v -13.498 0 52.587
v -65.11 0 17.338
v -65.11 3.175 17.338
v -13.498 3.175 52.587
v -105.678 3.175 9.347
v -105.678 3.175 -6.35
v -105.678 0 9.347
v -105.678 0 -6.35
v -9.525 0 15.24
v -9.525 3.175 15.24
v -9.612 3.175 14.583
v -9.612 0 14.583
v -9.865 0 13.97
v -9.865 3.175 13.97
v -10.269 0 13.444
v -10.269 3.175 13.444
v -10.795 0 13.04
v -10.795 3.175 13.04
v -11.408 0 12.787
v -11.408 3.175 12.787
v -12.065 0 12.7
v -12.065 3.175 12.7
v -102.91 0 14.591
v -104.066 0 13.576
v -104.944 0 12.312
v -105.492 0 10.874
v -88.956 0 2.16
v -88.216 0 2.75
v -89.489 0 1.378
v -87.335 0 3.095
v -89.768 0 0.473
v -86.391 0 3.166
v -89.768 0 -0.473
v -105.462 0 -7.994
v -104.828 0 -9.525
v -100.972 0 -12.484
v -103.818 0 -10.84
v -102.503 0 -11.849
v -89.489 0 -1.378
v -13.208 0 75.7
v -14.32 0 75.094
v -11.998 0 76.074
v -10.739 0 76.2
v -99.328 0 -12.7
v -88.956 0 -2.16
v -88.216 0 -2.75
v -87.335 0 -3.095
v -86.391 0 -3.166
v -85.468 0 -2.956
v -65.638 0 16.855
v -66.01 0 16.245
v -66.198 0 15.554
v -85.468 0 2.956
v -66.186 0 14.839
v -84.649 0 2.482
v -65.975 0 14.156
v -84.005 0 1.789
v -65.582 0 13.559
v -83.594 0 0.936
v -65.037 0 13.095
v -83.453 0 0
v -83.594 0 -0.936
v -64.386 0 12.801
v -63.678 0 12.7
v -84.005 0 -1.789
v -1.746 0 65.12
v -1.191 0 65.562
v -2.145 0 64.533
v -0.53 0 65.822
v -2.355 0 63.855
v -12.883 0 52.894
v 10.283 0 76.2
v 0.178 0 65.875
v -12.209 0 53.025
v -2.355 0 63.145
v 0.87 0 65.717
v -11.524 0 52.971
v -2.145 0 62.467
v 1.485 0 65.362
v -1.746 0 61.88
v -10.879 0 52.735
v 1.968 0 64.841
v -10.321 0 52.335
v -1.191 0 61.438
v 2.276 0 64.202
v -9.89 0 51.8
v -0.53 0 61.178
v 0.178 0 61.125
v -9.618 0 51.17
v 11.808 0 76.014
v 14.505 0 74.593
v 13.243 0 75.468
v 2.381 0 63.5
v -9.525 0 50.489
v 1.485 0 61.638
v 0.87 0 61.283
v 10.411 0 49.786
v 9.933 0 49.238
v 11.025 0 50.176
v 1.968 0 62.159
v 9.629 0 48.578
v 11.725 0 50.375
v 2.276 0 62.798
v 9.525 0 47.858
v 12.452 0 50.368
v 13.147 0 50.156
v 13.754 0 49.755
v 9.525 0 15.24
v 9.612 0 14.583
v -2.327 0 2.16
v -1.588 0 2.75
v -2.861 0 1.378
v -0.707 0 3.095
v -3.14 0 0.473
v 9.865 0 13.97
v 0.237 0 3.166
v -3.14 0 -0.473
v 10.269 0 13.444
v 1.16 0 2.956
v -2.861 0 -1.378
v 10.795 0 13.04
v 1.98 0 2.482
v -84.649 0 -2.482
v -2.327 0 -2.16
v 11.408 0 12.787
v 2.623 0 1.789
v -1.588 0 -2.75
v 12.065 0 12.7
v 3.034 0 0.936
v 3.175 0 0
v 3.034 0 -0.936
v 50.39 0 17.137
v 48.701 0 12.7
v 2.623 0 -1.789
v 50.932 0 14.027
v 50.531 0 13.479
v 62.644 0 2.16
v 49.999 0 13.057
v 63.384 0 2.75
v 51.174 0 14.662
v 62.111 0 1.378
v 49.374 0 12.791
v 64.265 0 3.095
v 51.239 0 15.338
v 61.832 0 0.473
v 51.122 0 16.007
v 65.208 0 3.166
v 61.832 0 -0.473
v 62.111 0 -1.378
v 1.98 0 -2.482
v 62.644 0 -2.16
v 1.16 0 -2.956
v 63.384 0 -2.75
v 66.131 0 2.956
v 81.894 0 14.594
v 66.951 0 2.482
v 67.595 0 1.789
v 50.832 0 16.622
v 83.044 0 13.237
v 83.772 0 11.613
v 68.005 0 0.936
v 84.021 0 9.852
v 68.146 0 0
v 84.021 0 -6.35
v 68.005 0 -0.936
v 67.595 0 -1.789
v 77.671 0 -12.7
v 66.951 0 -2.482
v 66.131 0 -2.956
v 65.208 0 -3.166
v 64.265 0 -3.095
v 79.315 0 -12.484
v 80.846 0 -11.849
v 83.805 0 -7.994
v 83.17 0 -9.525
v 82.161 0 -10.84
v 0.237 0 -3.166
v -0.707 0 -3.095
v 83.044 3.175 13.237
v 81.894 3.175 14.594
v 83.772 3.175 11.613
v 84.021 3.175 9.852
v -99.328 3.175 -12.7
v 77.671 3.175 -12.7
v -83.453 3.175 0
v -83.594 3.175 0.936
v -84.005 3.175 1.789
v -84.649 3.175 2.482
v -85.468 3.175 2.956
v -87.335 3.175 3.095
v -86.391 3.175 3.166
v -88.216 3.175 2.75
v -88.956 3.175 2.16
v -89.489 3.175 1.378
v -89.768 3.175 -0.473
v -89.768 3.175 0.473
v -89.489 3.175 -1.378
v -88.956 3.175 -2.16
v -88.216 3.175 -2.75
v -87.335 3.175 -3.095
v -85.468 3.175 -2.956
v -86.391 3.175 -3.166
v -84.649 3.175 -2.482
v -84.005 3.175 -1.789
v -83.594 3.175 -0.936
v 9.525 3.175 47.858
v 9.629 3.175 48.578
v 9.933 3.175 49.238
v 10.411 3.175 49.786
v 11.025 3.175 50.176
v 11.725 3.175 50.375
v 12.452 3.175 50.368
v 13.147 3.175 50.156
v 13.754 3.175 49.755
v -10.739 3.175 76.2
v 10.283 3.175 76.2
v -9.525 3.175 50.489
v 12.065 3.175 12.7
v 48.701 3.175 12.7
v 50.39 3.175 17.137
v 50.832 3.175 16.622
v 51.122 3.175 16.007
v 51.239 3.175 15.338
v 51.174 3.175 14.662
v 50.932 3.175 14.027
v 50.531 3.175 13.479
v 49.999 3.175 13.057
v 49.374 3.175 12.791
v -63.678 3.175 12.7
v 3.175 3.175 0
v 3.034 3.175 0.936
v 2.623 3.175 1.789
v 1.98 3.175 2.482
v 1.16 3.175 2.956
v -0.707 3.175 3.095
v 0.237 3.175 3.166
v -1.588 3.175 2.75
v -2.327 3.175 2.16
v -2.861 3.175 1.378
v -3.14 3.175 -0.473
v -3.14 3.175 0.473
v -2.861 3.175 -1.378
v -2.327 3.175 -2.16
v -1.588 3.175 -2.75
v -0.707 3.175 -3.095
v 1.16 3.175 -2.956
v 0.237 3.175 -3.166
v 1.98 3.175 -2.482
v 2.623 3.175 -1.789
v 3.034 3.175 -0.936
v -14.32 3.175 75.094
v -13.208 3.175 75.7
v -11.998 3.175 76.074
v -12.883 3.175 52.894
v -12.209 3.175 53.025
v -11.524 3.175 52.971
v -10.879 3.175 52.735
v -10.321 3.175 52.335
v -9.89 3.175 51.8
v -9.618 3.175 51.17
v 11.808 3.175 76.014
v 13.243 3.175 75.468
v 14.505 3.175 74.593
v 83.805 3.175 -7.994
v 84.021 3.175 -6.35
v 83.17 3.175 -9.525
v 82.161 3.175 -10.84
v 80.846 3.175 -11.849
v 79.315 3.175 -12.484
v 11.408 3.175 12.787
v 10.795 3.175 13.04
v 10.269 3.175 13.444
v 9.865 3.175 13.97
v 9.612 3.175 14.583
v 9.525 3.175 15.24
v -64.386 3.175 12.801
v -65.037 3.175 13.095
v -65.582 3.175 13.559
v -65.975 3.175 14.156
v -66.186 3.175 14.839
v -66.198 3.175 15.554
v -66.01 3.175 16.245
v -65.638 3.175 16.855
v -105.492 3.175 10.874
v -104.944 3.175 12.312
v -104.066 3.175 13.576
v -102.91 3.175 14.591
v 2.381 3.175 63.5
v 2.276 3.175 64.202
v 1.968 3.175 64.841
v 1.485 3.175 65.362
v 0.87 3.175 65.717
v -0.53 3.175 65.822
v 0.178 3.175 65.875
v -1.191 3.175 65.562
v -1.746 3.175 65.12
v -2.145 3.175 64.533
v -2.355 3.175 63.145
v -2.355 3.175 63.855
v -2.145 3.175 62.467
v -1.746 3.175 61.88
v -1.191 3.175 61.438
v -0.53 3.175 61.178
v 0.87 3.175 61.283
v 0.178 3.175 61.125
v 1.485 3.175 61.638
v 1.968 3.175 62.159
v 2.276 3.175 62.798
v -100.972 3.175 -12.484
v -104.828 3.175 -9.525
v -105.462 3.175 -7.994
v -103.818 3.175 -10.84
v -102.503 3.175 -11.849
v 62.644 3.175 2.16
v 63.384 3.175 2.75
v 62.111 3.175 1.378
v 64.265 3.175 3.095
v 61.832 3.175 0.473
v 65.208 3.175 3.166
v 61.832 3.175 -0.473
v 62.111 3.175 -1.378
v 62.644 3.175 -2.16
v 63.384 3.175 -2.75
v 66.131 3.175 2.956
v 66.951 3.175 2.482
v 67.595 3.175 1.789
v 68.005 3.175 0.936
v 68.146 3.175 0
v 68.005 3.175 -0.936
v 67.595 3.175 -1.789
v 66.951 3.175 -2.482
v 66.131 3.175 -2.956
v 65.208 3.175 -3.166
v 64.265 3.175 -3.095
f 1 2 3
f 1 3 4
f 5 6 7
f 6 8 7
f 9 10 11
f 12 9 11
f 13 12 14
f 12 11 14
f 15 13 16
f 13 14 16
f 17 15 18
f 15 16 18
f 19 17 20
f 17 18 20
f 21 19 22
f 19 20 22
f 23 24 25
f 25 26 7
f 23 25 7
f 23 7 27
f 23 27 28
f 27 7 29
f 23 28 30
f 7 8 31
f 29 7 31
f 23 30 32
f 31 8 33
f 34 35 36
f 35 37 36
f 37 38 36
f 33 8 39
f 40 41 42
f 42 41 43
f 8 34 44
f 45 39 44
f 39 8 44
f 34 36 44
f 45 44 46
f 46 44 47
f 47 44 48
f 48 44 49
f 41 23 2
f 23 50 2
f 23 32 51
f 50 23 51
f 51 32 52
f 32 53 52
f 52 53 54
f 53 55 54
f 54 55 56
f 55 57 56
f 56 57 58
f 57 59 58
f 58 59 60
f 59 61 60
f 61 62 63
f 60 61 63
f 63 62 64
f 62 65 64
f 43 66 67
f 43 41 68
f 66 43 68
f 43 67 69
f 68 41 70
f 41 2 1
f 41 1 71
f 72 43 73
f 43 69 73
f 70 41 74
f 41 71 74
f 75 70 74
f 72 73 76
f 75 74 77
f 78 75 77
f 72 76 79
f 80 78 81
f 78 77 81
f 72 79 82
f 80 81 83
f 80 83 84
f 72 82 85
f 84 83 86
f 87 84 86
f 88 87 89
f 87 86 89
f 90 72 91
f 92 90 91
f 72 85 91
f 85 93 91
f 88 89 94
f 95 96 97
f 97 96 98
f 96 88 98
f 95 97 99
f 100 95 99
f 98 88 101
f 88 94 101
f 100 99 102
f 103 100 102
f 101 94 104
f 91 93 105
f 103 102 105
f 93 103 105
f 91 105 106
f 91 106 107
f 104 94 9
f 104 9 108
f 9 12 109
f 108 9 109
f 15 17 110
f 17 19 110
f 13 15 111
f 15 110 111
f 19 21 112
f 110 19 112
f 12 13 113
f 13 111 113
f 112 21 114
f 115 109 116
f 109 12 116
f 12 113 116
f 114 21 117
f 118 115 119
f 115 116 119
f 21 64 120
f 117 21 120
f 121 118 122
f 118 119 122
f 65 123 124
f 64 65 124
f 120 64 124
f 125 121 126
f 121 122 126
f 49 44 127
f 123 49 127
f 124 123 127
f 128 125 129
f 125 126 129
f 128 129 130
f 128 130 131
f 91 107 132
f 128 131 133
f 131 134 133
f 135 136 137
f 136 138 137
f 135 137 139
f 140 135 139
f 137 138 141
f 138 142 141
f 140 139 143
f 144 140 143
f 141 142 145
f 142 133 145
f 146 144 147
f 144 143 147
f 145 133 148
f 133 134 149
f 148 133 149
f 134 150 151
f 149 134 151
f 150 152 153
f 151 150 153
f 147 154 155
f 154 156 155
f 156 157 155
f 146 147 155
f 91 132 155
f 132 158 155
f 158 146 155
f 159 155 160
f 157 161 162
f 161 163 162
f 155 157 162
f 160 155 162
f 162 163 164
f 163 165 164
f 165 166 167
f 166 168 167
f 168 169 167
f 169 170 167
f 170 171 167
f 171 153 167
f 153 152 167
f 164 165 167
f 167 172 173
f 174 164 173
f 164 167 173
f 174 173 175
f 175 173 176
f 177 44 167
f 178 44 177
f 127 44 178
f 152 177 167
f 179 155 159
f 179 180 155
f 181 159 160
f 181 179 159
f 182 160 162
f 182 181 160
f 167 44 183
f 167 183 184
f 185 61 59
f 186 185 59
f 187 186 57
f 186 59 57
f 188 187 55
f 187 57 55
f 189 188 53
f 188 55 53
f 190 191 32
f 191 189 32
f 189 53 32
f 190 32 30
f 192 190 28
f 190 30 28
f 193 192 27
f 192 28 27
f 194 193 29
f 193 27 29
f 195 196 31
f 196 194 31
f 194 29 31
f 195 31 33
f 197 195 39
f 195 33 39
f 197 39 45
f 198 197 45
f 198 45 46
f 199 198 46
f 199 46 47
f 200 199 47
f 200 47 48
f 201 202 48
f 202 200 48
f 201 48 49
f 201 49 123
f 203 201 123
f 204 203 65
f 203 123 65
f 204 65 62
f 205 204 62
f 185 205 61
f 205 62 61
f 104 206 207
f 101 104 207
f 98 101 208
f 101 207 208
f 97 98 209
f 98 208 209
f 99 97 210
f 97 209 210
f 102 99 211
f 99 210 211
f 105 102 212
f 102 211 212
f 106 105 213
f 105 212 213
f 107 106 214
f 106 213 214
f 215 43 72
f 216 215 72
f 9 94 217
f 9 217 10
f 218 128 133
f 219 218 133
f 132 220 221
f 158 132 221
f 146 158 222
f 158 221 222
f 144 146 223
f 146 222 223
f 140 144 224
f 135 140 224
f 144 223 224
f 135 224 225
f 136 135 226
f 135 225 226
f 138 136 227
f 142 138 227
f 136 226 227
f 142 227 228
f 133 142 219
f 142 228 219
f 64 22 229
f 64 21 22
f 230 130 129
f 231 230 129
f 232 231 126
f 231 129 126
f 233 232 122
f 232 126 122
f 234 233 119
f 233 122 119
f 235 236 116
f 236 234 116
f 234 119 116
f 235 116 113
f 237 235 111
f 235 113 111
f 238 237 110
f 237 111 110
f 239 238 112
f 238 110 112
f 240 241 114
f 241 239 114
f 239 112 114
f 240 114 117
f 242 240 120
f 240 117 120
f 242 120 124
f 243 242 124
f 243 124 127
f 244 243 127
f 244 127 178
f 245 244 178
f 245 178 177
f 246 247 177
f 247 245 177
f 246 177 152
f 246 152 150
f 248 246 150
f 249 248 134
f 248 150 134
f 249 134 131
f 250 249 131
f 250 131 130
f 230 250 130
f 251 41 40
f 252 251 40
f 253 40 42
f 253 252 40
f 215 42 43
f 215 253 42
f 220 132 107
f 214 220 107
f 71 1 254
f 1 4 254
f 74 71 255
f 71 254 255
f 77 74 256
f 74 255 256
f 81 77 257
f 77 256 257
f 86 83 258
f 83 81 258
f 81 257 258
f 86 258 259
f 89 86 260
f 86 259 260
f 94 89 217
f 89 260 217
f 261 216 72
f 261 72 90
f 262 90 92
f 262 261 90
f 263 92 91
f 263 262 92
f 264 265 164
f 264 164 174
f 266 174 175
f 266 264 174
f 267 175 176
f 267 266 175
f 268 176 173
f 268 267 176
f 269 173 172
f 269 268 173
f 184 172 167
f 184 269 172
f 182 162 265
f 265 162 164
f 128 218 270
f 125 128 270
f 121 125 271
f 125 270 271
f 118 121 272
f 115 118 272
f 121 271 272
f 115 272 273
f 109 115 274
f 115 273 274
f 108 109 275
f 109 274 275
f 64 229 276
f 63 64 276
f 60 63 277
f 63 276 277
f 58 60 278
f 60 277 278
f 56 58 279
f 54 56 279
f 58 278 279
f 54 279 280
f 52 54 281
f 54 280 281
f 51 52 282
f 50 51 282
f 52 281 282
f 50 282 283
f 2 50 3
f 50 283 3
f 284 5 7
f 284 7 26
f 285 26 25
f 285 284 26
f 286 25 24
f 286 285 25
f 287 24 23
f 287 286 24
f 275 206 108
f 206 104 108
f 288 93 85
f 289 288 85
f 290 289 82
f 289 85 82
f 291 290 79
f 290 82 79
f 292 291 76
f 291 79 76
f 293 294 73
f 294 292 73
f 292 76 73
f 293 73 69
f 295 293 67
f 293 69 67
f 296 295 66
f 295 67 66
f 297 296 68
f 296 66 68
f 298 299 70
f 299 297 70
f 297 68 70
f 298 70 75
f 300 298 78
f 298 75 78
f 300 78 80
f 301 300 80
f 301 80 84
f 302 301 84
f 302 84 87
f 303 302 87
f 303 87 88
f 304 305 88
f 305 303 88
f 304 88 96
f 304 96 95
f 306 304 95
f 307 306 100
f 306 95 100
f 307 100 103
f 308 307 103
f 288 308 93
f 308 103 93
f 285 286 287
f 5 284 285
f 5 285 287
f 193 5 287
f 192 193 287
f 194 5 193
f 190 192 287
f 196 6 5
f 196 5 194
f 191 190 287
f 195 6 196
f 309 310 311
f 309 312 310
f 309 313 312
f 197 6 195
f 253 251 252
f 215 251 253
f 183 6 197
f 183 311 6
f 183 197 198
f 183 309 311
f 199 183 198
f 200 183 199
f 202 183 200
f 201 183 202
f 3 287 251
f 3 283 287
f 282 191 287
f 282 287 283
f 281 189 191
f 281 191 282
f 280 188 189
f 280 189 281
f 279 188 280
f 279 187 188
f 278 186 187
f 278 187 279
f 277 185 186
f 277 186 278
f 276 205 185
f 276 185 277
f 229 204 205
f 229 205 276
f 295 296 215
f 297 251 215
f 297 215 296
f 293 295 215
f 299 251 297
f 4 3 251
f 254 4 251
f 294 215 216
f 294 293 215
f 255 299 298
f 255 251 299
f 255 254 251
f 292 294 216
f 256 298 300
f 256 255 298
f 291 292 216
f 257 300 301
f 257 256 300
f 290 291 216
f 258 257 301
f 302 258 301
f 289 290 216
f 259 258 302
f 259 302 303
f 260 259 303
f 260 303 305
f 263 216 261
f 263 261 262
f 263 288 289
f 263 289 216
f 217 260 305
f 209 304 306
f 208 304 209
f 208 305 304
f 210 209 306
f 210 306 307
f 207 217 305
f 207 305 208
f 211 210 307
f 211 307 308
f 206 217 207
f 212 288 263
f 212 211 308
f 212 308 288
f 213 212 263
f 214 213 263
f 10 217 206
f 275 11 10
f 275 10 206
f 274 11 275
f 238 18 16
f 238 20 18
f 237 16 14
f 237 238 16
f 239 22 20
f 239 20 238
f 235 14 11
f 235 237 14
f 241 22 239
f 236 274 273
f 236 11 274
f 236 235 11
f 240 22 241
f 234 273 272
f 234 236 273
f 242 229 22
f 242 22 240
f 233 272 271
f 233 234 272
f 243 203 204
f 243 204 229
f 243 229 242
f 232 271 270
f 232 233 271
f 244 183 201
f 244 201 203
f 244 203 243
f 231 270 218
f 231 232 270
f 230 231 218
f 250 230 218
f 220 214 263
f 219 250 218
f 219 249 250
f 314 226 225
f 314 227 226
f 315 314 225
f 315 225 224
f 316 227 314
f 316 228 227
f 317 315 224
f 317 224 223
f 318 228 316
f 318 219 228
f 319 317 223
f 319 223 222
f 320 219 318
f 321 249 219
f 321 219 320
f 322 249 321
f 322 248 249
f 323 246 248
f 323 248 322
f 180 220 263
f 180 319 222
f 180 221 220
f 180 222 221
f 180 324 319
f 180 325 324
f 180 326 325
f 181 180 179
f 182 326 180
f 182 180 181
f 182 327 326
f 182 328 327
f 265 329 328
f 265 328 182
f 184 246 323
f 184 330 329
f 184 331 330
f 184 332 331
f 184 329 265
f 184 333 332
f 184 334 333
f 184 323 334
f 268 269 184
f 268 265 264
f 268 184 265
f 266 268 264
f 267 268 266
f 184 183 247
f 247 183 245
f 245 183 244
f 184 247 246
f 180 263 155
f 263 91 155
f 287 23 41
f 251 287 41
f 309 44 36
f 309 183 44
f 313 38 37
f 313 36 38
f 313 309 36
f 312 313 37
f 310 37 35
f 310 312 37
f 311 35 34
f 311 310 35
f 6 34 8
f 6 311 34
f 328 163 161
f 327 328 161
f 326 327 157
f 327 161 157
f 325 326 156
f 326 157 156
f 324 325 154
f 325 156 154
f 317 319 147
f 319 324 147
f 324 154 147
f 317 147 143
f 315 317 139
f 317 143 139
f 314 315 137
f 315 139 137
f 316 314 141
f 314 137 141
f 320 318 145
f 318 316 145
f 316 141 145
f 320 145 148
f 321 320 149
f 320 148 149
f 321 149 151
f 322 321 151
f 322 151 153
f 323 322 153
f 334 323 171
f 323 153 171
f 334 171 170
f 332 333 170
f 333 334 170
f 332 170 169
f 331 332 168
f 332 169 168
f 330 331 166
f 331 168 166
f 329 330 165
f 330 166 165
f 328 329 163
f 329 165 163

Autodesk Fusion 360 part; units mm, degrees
sketch "Base Bell Crank" plane through (0, 0, 0) normal (0, 1, 0) x (1, 0, 0)
  circle A0 centre (64.9712, 0) radius 3.175
  circle A1 centre (-86.6283, 0) radius 3.175
  circle A2 centre (0, -63.5) radius 2.3813
  circle A3 centre (0, 0) radius 3.175
  line L0 (0, -63.5) -> (0, 0) construction
  line L1 (0, 0) -> (64.9712, 0) construction
  line L2 (0, 0) -> (-86.6283, 0) construction
  line L3 (-12.7, -76.2) -> (12.7, -76.2)
  line L4 (12.7, -76.2) -> (84.0212, -12.7)
  line L5 (-105.6783, 12.7) -> (-105.6783, -12.7)
  line L6 (0, -63.5) -> (0, -76.2) construction
  line L7 (64.9712, 0) -> (84.0212, 0) construction
  line L8 (84.0212, -12.7) -> (84.0212, 12.7)
  line L9 (-105.6783, 12.7) -> (84.0212, 12.7)
  line L10 (-105.6783, -12.7) -> (-12.7, -76.2)
  dimension "d12" = 4.7625
  dimension "d13" = 6.35
  dimension "d19" = 6.35
  dimension "d20" = 63.5
  dimension "d21" = 64.9712
  dimension "d22" = 86.6283
  dimension "d48" = 25.4
  dimension "d54" = 12.7
  dimension "d56" = 12.7
  dimension "d58" = 12.7
  dimension "d87" = 19.05
  dimension "d88" = 19.05
sketch "Sketch3" plane through (0, 0, 0) normal (0, 1, 0) x (1, 0, 0)
  line L0 (12.7, -76.2) -> (84.0212, -12.7)
  line L1 (0, -63.5) -> (0, 0)
  line L2 (0, 0) -> (64.9712, 0)
  line L3 (9.525, -53.5204) -> (9.525, -12.7)
  line L4 (9.525, -12.7) -> (55.3732, -12.7)
  line L5 (55.3732, -12.7) -> (9.525, -53.5204)
  line L6 (-9.525, -12.7) -> (-71.9004, -12.7)
  line L7 (-71.9004, -12.7) -> (-9.525, -55.2996)
  line L8 (-9.525, -55.2996) -> (-9.525, -12.7)
  line L9 (-105.6783, -12.7) -> (-12.7, -76.2)
  line L10 (-105.6783, 12.7) -> (84.0212, 12.7)
  line L11 (-9.525, -55.2996) -> (9.525, -53.5204) construction
  point P0 (0, -54.41)
  dimension "d93" = 19.05
  dimension "d96" = 19.05
  dimension "d98" = 25.4
  dimension "d103" = 19.05
  dimension "d104" = 25.4
extrude "Extrude1" add sketch "Base Bell Crank" along normal blind 3.175
extrude "Extrude2" cut sketch "Sketch3" along normal up to surface (3.175 mm away)
fillet "Fillet1" radius 2.54 6 edges at (-71.9004, 1.5875, 12.7) (-9.525, 1.5875, 12.7) (-9.525, 1.5875, 55.2996) (9.525, 1.5875, 53.5204) (9.525, 1.5875, 12.7) (55.3732, 1.5875, 12.7)
fillet "Fillet2" radius 6.35 2 edges at (12.7, 1.5875, 76.2) (84.0212, 1.5875, 12.7)
fillet "Fillet2" radius 6.35 2 edges at (-105.6783, 1.5875, -12.7) (84.0212, 1.5875, -12.7)
fillet "Fillet2" radius 6.35 2 edges at (-12.7, 1.5875, 76.2) (-105.6783, 1.5875, 12.7)
equation "AngleUp = 20 deg"
equation "AngleDown = 15 deg"
equation "EyeBoltRadius = 1.4 in"
equation "EBDistCC = ( AngleUp * 3.1415 * 2 * EyeBoltRadius ) / 360 deg"
equation "EBDistCCW = ( AngleDown * 3.1415 * 2 * EyeBoltRadius ) / 360 deg"
equation "TopHoletoPivot = 2.5 in"
equation "BellCrankAngleDown = ( EBDistCCW * 360 deg ) / ( TopHoletoPivot * 3.1415 * 2 )"
equation "BellCrankAngleUp = ( EBDistCC * 360 deg ) / ( TopHoletoPivot * 3.1415 * 2 )"
equation "PullDist = 0.5 in"
equation "RightHoleDist = ( PullDist * 360 deg ) / ( 3.1415 * 2 * BellCrankAngleUp )"
equation "LeftHoleDist = ( PullDist * 360 deg ) / ( 3.1415 * 2 * BellCrankAngleDown )"
equation "d12 = TopHoleOD"
equation "d13 = CableHoleOD"
equation "TopHoleOD = ( 3 / 16 ) * 1 in"
equation "CableHoleOD = 0.25 in"
equation "StrutHoleOD = 0.25 in"
equation "d19 = StrutHoleOD"
equation "d20 = TopHoletoPivot"
equation "d21 = RightHoleDist"
equation "d22 = LeftHoleDist"
equation "d37 = ( 3 / 8 ) * 1 in"
equation "d39 = ( 3 / 8 ) * 1 in"
equation "d41 = ( 3 / 8 ) * 1 in"
equation "d83 = ( 3 / 8 ) * 1 in"
